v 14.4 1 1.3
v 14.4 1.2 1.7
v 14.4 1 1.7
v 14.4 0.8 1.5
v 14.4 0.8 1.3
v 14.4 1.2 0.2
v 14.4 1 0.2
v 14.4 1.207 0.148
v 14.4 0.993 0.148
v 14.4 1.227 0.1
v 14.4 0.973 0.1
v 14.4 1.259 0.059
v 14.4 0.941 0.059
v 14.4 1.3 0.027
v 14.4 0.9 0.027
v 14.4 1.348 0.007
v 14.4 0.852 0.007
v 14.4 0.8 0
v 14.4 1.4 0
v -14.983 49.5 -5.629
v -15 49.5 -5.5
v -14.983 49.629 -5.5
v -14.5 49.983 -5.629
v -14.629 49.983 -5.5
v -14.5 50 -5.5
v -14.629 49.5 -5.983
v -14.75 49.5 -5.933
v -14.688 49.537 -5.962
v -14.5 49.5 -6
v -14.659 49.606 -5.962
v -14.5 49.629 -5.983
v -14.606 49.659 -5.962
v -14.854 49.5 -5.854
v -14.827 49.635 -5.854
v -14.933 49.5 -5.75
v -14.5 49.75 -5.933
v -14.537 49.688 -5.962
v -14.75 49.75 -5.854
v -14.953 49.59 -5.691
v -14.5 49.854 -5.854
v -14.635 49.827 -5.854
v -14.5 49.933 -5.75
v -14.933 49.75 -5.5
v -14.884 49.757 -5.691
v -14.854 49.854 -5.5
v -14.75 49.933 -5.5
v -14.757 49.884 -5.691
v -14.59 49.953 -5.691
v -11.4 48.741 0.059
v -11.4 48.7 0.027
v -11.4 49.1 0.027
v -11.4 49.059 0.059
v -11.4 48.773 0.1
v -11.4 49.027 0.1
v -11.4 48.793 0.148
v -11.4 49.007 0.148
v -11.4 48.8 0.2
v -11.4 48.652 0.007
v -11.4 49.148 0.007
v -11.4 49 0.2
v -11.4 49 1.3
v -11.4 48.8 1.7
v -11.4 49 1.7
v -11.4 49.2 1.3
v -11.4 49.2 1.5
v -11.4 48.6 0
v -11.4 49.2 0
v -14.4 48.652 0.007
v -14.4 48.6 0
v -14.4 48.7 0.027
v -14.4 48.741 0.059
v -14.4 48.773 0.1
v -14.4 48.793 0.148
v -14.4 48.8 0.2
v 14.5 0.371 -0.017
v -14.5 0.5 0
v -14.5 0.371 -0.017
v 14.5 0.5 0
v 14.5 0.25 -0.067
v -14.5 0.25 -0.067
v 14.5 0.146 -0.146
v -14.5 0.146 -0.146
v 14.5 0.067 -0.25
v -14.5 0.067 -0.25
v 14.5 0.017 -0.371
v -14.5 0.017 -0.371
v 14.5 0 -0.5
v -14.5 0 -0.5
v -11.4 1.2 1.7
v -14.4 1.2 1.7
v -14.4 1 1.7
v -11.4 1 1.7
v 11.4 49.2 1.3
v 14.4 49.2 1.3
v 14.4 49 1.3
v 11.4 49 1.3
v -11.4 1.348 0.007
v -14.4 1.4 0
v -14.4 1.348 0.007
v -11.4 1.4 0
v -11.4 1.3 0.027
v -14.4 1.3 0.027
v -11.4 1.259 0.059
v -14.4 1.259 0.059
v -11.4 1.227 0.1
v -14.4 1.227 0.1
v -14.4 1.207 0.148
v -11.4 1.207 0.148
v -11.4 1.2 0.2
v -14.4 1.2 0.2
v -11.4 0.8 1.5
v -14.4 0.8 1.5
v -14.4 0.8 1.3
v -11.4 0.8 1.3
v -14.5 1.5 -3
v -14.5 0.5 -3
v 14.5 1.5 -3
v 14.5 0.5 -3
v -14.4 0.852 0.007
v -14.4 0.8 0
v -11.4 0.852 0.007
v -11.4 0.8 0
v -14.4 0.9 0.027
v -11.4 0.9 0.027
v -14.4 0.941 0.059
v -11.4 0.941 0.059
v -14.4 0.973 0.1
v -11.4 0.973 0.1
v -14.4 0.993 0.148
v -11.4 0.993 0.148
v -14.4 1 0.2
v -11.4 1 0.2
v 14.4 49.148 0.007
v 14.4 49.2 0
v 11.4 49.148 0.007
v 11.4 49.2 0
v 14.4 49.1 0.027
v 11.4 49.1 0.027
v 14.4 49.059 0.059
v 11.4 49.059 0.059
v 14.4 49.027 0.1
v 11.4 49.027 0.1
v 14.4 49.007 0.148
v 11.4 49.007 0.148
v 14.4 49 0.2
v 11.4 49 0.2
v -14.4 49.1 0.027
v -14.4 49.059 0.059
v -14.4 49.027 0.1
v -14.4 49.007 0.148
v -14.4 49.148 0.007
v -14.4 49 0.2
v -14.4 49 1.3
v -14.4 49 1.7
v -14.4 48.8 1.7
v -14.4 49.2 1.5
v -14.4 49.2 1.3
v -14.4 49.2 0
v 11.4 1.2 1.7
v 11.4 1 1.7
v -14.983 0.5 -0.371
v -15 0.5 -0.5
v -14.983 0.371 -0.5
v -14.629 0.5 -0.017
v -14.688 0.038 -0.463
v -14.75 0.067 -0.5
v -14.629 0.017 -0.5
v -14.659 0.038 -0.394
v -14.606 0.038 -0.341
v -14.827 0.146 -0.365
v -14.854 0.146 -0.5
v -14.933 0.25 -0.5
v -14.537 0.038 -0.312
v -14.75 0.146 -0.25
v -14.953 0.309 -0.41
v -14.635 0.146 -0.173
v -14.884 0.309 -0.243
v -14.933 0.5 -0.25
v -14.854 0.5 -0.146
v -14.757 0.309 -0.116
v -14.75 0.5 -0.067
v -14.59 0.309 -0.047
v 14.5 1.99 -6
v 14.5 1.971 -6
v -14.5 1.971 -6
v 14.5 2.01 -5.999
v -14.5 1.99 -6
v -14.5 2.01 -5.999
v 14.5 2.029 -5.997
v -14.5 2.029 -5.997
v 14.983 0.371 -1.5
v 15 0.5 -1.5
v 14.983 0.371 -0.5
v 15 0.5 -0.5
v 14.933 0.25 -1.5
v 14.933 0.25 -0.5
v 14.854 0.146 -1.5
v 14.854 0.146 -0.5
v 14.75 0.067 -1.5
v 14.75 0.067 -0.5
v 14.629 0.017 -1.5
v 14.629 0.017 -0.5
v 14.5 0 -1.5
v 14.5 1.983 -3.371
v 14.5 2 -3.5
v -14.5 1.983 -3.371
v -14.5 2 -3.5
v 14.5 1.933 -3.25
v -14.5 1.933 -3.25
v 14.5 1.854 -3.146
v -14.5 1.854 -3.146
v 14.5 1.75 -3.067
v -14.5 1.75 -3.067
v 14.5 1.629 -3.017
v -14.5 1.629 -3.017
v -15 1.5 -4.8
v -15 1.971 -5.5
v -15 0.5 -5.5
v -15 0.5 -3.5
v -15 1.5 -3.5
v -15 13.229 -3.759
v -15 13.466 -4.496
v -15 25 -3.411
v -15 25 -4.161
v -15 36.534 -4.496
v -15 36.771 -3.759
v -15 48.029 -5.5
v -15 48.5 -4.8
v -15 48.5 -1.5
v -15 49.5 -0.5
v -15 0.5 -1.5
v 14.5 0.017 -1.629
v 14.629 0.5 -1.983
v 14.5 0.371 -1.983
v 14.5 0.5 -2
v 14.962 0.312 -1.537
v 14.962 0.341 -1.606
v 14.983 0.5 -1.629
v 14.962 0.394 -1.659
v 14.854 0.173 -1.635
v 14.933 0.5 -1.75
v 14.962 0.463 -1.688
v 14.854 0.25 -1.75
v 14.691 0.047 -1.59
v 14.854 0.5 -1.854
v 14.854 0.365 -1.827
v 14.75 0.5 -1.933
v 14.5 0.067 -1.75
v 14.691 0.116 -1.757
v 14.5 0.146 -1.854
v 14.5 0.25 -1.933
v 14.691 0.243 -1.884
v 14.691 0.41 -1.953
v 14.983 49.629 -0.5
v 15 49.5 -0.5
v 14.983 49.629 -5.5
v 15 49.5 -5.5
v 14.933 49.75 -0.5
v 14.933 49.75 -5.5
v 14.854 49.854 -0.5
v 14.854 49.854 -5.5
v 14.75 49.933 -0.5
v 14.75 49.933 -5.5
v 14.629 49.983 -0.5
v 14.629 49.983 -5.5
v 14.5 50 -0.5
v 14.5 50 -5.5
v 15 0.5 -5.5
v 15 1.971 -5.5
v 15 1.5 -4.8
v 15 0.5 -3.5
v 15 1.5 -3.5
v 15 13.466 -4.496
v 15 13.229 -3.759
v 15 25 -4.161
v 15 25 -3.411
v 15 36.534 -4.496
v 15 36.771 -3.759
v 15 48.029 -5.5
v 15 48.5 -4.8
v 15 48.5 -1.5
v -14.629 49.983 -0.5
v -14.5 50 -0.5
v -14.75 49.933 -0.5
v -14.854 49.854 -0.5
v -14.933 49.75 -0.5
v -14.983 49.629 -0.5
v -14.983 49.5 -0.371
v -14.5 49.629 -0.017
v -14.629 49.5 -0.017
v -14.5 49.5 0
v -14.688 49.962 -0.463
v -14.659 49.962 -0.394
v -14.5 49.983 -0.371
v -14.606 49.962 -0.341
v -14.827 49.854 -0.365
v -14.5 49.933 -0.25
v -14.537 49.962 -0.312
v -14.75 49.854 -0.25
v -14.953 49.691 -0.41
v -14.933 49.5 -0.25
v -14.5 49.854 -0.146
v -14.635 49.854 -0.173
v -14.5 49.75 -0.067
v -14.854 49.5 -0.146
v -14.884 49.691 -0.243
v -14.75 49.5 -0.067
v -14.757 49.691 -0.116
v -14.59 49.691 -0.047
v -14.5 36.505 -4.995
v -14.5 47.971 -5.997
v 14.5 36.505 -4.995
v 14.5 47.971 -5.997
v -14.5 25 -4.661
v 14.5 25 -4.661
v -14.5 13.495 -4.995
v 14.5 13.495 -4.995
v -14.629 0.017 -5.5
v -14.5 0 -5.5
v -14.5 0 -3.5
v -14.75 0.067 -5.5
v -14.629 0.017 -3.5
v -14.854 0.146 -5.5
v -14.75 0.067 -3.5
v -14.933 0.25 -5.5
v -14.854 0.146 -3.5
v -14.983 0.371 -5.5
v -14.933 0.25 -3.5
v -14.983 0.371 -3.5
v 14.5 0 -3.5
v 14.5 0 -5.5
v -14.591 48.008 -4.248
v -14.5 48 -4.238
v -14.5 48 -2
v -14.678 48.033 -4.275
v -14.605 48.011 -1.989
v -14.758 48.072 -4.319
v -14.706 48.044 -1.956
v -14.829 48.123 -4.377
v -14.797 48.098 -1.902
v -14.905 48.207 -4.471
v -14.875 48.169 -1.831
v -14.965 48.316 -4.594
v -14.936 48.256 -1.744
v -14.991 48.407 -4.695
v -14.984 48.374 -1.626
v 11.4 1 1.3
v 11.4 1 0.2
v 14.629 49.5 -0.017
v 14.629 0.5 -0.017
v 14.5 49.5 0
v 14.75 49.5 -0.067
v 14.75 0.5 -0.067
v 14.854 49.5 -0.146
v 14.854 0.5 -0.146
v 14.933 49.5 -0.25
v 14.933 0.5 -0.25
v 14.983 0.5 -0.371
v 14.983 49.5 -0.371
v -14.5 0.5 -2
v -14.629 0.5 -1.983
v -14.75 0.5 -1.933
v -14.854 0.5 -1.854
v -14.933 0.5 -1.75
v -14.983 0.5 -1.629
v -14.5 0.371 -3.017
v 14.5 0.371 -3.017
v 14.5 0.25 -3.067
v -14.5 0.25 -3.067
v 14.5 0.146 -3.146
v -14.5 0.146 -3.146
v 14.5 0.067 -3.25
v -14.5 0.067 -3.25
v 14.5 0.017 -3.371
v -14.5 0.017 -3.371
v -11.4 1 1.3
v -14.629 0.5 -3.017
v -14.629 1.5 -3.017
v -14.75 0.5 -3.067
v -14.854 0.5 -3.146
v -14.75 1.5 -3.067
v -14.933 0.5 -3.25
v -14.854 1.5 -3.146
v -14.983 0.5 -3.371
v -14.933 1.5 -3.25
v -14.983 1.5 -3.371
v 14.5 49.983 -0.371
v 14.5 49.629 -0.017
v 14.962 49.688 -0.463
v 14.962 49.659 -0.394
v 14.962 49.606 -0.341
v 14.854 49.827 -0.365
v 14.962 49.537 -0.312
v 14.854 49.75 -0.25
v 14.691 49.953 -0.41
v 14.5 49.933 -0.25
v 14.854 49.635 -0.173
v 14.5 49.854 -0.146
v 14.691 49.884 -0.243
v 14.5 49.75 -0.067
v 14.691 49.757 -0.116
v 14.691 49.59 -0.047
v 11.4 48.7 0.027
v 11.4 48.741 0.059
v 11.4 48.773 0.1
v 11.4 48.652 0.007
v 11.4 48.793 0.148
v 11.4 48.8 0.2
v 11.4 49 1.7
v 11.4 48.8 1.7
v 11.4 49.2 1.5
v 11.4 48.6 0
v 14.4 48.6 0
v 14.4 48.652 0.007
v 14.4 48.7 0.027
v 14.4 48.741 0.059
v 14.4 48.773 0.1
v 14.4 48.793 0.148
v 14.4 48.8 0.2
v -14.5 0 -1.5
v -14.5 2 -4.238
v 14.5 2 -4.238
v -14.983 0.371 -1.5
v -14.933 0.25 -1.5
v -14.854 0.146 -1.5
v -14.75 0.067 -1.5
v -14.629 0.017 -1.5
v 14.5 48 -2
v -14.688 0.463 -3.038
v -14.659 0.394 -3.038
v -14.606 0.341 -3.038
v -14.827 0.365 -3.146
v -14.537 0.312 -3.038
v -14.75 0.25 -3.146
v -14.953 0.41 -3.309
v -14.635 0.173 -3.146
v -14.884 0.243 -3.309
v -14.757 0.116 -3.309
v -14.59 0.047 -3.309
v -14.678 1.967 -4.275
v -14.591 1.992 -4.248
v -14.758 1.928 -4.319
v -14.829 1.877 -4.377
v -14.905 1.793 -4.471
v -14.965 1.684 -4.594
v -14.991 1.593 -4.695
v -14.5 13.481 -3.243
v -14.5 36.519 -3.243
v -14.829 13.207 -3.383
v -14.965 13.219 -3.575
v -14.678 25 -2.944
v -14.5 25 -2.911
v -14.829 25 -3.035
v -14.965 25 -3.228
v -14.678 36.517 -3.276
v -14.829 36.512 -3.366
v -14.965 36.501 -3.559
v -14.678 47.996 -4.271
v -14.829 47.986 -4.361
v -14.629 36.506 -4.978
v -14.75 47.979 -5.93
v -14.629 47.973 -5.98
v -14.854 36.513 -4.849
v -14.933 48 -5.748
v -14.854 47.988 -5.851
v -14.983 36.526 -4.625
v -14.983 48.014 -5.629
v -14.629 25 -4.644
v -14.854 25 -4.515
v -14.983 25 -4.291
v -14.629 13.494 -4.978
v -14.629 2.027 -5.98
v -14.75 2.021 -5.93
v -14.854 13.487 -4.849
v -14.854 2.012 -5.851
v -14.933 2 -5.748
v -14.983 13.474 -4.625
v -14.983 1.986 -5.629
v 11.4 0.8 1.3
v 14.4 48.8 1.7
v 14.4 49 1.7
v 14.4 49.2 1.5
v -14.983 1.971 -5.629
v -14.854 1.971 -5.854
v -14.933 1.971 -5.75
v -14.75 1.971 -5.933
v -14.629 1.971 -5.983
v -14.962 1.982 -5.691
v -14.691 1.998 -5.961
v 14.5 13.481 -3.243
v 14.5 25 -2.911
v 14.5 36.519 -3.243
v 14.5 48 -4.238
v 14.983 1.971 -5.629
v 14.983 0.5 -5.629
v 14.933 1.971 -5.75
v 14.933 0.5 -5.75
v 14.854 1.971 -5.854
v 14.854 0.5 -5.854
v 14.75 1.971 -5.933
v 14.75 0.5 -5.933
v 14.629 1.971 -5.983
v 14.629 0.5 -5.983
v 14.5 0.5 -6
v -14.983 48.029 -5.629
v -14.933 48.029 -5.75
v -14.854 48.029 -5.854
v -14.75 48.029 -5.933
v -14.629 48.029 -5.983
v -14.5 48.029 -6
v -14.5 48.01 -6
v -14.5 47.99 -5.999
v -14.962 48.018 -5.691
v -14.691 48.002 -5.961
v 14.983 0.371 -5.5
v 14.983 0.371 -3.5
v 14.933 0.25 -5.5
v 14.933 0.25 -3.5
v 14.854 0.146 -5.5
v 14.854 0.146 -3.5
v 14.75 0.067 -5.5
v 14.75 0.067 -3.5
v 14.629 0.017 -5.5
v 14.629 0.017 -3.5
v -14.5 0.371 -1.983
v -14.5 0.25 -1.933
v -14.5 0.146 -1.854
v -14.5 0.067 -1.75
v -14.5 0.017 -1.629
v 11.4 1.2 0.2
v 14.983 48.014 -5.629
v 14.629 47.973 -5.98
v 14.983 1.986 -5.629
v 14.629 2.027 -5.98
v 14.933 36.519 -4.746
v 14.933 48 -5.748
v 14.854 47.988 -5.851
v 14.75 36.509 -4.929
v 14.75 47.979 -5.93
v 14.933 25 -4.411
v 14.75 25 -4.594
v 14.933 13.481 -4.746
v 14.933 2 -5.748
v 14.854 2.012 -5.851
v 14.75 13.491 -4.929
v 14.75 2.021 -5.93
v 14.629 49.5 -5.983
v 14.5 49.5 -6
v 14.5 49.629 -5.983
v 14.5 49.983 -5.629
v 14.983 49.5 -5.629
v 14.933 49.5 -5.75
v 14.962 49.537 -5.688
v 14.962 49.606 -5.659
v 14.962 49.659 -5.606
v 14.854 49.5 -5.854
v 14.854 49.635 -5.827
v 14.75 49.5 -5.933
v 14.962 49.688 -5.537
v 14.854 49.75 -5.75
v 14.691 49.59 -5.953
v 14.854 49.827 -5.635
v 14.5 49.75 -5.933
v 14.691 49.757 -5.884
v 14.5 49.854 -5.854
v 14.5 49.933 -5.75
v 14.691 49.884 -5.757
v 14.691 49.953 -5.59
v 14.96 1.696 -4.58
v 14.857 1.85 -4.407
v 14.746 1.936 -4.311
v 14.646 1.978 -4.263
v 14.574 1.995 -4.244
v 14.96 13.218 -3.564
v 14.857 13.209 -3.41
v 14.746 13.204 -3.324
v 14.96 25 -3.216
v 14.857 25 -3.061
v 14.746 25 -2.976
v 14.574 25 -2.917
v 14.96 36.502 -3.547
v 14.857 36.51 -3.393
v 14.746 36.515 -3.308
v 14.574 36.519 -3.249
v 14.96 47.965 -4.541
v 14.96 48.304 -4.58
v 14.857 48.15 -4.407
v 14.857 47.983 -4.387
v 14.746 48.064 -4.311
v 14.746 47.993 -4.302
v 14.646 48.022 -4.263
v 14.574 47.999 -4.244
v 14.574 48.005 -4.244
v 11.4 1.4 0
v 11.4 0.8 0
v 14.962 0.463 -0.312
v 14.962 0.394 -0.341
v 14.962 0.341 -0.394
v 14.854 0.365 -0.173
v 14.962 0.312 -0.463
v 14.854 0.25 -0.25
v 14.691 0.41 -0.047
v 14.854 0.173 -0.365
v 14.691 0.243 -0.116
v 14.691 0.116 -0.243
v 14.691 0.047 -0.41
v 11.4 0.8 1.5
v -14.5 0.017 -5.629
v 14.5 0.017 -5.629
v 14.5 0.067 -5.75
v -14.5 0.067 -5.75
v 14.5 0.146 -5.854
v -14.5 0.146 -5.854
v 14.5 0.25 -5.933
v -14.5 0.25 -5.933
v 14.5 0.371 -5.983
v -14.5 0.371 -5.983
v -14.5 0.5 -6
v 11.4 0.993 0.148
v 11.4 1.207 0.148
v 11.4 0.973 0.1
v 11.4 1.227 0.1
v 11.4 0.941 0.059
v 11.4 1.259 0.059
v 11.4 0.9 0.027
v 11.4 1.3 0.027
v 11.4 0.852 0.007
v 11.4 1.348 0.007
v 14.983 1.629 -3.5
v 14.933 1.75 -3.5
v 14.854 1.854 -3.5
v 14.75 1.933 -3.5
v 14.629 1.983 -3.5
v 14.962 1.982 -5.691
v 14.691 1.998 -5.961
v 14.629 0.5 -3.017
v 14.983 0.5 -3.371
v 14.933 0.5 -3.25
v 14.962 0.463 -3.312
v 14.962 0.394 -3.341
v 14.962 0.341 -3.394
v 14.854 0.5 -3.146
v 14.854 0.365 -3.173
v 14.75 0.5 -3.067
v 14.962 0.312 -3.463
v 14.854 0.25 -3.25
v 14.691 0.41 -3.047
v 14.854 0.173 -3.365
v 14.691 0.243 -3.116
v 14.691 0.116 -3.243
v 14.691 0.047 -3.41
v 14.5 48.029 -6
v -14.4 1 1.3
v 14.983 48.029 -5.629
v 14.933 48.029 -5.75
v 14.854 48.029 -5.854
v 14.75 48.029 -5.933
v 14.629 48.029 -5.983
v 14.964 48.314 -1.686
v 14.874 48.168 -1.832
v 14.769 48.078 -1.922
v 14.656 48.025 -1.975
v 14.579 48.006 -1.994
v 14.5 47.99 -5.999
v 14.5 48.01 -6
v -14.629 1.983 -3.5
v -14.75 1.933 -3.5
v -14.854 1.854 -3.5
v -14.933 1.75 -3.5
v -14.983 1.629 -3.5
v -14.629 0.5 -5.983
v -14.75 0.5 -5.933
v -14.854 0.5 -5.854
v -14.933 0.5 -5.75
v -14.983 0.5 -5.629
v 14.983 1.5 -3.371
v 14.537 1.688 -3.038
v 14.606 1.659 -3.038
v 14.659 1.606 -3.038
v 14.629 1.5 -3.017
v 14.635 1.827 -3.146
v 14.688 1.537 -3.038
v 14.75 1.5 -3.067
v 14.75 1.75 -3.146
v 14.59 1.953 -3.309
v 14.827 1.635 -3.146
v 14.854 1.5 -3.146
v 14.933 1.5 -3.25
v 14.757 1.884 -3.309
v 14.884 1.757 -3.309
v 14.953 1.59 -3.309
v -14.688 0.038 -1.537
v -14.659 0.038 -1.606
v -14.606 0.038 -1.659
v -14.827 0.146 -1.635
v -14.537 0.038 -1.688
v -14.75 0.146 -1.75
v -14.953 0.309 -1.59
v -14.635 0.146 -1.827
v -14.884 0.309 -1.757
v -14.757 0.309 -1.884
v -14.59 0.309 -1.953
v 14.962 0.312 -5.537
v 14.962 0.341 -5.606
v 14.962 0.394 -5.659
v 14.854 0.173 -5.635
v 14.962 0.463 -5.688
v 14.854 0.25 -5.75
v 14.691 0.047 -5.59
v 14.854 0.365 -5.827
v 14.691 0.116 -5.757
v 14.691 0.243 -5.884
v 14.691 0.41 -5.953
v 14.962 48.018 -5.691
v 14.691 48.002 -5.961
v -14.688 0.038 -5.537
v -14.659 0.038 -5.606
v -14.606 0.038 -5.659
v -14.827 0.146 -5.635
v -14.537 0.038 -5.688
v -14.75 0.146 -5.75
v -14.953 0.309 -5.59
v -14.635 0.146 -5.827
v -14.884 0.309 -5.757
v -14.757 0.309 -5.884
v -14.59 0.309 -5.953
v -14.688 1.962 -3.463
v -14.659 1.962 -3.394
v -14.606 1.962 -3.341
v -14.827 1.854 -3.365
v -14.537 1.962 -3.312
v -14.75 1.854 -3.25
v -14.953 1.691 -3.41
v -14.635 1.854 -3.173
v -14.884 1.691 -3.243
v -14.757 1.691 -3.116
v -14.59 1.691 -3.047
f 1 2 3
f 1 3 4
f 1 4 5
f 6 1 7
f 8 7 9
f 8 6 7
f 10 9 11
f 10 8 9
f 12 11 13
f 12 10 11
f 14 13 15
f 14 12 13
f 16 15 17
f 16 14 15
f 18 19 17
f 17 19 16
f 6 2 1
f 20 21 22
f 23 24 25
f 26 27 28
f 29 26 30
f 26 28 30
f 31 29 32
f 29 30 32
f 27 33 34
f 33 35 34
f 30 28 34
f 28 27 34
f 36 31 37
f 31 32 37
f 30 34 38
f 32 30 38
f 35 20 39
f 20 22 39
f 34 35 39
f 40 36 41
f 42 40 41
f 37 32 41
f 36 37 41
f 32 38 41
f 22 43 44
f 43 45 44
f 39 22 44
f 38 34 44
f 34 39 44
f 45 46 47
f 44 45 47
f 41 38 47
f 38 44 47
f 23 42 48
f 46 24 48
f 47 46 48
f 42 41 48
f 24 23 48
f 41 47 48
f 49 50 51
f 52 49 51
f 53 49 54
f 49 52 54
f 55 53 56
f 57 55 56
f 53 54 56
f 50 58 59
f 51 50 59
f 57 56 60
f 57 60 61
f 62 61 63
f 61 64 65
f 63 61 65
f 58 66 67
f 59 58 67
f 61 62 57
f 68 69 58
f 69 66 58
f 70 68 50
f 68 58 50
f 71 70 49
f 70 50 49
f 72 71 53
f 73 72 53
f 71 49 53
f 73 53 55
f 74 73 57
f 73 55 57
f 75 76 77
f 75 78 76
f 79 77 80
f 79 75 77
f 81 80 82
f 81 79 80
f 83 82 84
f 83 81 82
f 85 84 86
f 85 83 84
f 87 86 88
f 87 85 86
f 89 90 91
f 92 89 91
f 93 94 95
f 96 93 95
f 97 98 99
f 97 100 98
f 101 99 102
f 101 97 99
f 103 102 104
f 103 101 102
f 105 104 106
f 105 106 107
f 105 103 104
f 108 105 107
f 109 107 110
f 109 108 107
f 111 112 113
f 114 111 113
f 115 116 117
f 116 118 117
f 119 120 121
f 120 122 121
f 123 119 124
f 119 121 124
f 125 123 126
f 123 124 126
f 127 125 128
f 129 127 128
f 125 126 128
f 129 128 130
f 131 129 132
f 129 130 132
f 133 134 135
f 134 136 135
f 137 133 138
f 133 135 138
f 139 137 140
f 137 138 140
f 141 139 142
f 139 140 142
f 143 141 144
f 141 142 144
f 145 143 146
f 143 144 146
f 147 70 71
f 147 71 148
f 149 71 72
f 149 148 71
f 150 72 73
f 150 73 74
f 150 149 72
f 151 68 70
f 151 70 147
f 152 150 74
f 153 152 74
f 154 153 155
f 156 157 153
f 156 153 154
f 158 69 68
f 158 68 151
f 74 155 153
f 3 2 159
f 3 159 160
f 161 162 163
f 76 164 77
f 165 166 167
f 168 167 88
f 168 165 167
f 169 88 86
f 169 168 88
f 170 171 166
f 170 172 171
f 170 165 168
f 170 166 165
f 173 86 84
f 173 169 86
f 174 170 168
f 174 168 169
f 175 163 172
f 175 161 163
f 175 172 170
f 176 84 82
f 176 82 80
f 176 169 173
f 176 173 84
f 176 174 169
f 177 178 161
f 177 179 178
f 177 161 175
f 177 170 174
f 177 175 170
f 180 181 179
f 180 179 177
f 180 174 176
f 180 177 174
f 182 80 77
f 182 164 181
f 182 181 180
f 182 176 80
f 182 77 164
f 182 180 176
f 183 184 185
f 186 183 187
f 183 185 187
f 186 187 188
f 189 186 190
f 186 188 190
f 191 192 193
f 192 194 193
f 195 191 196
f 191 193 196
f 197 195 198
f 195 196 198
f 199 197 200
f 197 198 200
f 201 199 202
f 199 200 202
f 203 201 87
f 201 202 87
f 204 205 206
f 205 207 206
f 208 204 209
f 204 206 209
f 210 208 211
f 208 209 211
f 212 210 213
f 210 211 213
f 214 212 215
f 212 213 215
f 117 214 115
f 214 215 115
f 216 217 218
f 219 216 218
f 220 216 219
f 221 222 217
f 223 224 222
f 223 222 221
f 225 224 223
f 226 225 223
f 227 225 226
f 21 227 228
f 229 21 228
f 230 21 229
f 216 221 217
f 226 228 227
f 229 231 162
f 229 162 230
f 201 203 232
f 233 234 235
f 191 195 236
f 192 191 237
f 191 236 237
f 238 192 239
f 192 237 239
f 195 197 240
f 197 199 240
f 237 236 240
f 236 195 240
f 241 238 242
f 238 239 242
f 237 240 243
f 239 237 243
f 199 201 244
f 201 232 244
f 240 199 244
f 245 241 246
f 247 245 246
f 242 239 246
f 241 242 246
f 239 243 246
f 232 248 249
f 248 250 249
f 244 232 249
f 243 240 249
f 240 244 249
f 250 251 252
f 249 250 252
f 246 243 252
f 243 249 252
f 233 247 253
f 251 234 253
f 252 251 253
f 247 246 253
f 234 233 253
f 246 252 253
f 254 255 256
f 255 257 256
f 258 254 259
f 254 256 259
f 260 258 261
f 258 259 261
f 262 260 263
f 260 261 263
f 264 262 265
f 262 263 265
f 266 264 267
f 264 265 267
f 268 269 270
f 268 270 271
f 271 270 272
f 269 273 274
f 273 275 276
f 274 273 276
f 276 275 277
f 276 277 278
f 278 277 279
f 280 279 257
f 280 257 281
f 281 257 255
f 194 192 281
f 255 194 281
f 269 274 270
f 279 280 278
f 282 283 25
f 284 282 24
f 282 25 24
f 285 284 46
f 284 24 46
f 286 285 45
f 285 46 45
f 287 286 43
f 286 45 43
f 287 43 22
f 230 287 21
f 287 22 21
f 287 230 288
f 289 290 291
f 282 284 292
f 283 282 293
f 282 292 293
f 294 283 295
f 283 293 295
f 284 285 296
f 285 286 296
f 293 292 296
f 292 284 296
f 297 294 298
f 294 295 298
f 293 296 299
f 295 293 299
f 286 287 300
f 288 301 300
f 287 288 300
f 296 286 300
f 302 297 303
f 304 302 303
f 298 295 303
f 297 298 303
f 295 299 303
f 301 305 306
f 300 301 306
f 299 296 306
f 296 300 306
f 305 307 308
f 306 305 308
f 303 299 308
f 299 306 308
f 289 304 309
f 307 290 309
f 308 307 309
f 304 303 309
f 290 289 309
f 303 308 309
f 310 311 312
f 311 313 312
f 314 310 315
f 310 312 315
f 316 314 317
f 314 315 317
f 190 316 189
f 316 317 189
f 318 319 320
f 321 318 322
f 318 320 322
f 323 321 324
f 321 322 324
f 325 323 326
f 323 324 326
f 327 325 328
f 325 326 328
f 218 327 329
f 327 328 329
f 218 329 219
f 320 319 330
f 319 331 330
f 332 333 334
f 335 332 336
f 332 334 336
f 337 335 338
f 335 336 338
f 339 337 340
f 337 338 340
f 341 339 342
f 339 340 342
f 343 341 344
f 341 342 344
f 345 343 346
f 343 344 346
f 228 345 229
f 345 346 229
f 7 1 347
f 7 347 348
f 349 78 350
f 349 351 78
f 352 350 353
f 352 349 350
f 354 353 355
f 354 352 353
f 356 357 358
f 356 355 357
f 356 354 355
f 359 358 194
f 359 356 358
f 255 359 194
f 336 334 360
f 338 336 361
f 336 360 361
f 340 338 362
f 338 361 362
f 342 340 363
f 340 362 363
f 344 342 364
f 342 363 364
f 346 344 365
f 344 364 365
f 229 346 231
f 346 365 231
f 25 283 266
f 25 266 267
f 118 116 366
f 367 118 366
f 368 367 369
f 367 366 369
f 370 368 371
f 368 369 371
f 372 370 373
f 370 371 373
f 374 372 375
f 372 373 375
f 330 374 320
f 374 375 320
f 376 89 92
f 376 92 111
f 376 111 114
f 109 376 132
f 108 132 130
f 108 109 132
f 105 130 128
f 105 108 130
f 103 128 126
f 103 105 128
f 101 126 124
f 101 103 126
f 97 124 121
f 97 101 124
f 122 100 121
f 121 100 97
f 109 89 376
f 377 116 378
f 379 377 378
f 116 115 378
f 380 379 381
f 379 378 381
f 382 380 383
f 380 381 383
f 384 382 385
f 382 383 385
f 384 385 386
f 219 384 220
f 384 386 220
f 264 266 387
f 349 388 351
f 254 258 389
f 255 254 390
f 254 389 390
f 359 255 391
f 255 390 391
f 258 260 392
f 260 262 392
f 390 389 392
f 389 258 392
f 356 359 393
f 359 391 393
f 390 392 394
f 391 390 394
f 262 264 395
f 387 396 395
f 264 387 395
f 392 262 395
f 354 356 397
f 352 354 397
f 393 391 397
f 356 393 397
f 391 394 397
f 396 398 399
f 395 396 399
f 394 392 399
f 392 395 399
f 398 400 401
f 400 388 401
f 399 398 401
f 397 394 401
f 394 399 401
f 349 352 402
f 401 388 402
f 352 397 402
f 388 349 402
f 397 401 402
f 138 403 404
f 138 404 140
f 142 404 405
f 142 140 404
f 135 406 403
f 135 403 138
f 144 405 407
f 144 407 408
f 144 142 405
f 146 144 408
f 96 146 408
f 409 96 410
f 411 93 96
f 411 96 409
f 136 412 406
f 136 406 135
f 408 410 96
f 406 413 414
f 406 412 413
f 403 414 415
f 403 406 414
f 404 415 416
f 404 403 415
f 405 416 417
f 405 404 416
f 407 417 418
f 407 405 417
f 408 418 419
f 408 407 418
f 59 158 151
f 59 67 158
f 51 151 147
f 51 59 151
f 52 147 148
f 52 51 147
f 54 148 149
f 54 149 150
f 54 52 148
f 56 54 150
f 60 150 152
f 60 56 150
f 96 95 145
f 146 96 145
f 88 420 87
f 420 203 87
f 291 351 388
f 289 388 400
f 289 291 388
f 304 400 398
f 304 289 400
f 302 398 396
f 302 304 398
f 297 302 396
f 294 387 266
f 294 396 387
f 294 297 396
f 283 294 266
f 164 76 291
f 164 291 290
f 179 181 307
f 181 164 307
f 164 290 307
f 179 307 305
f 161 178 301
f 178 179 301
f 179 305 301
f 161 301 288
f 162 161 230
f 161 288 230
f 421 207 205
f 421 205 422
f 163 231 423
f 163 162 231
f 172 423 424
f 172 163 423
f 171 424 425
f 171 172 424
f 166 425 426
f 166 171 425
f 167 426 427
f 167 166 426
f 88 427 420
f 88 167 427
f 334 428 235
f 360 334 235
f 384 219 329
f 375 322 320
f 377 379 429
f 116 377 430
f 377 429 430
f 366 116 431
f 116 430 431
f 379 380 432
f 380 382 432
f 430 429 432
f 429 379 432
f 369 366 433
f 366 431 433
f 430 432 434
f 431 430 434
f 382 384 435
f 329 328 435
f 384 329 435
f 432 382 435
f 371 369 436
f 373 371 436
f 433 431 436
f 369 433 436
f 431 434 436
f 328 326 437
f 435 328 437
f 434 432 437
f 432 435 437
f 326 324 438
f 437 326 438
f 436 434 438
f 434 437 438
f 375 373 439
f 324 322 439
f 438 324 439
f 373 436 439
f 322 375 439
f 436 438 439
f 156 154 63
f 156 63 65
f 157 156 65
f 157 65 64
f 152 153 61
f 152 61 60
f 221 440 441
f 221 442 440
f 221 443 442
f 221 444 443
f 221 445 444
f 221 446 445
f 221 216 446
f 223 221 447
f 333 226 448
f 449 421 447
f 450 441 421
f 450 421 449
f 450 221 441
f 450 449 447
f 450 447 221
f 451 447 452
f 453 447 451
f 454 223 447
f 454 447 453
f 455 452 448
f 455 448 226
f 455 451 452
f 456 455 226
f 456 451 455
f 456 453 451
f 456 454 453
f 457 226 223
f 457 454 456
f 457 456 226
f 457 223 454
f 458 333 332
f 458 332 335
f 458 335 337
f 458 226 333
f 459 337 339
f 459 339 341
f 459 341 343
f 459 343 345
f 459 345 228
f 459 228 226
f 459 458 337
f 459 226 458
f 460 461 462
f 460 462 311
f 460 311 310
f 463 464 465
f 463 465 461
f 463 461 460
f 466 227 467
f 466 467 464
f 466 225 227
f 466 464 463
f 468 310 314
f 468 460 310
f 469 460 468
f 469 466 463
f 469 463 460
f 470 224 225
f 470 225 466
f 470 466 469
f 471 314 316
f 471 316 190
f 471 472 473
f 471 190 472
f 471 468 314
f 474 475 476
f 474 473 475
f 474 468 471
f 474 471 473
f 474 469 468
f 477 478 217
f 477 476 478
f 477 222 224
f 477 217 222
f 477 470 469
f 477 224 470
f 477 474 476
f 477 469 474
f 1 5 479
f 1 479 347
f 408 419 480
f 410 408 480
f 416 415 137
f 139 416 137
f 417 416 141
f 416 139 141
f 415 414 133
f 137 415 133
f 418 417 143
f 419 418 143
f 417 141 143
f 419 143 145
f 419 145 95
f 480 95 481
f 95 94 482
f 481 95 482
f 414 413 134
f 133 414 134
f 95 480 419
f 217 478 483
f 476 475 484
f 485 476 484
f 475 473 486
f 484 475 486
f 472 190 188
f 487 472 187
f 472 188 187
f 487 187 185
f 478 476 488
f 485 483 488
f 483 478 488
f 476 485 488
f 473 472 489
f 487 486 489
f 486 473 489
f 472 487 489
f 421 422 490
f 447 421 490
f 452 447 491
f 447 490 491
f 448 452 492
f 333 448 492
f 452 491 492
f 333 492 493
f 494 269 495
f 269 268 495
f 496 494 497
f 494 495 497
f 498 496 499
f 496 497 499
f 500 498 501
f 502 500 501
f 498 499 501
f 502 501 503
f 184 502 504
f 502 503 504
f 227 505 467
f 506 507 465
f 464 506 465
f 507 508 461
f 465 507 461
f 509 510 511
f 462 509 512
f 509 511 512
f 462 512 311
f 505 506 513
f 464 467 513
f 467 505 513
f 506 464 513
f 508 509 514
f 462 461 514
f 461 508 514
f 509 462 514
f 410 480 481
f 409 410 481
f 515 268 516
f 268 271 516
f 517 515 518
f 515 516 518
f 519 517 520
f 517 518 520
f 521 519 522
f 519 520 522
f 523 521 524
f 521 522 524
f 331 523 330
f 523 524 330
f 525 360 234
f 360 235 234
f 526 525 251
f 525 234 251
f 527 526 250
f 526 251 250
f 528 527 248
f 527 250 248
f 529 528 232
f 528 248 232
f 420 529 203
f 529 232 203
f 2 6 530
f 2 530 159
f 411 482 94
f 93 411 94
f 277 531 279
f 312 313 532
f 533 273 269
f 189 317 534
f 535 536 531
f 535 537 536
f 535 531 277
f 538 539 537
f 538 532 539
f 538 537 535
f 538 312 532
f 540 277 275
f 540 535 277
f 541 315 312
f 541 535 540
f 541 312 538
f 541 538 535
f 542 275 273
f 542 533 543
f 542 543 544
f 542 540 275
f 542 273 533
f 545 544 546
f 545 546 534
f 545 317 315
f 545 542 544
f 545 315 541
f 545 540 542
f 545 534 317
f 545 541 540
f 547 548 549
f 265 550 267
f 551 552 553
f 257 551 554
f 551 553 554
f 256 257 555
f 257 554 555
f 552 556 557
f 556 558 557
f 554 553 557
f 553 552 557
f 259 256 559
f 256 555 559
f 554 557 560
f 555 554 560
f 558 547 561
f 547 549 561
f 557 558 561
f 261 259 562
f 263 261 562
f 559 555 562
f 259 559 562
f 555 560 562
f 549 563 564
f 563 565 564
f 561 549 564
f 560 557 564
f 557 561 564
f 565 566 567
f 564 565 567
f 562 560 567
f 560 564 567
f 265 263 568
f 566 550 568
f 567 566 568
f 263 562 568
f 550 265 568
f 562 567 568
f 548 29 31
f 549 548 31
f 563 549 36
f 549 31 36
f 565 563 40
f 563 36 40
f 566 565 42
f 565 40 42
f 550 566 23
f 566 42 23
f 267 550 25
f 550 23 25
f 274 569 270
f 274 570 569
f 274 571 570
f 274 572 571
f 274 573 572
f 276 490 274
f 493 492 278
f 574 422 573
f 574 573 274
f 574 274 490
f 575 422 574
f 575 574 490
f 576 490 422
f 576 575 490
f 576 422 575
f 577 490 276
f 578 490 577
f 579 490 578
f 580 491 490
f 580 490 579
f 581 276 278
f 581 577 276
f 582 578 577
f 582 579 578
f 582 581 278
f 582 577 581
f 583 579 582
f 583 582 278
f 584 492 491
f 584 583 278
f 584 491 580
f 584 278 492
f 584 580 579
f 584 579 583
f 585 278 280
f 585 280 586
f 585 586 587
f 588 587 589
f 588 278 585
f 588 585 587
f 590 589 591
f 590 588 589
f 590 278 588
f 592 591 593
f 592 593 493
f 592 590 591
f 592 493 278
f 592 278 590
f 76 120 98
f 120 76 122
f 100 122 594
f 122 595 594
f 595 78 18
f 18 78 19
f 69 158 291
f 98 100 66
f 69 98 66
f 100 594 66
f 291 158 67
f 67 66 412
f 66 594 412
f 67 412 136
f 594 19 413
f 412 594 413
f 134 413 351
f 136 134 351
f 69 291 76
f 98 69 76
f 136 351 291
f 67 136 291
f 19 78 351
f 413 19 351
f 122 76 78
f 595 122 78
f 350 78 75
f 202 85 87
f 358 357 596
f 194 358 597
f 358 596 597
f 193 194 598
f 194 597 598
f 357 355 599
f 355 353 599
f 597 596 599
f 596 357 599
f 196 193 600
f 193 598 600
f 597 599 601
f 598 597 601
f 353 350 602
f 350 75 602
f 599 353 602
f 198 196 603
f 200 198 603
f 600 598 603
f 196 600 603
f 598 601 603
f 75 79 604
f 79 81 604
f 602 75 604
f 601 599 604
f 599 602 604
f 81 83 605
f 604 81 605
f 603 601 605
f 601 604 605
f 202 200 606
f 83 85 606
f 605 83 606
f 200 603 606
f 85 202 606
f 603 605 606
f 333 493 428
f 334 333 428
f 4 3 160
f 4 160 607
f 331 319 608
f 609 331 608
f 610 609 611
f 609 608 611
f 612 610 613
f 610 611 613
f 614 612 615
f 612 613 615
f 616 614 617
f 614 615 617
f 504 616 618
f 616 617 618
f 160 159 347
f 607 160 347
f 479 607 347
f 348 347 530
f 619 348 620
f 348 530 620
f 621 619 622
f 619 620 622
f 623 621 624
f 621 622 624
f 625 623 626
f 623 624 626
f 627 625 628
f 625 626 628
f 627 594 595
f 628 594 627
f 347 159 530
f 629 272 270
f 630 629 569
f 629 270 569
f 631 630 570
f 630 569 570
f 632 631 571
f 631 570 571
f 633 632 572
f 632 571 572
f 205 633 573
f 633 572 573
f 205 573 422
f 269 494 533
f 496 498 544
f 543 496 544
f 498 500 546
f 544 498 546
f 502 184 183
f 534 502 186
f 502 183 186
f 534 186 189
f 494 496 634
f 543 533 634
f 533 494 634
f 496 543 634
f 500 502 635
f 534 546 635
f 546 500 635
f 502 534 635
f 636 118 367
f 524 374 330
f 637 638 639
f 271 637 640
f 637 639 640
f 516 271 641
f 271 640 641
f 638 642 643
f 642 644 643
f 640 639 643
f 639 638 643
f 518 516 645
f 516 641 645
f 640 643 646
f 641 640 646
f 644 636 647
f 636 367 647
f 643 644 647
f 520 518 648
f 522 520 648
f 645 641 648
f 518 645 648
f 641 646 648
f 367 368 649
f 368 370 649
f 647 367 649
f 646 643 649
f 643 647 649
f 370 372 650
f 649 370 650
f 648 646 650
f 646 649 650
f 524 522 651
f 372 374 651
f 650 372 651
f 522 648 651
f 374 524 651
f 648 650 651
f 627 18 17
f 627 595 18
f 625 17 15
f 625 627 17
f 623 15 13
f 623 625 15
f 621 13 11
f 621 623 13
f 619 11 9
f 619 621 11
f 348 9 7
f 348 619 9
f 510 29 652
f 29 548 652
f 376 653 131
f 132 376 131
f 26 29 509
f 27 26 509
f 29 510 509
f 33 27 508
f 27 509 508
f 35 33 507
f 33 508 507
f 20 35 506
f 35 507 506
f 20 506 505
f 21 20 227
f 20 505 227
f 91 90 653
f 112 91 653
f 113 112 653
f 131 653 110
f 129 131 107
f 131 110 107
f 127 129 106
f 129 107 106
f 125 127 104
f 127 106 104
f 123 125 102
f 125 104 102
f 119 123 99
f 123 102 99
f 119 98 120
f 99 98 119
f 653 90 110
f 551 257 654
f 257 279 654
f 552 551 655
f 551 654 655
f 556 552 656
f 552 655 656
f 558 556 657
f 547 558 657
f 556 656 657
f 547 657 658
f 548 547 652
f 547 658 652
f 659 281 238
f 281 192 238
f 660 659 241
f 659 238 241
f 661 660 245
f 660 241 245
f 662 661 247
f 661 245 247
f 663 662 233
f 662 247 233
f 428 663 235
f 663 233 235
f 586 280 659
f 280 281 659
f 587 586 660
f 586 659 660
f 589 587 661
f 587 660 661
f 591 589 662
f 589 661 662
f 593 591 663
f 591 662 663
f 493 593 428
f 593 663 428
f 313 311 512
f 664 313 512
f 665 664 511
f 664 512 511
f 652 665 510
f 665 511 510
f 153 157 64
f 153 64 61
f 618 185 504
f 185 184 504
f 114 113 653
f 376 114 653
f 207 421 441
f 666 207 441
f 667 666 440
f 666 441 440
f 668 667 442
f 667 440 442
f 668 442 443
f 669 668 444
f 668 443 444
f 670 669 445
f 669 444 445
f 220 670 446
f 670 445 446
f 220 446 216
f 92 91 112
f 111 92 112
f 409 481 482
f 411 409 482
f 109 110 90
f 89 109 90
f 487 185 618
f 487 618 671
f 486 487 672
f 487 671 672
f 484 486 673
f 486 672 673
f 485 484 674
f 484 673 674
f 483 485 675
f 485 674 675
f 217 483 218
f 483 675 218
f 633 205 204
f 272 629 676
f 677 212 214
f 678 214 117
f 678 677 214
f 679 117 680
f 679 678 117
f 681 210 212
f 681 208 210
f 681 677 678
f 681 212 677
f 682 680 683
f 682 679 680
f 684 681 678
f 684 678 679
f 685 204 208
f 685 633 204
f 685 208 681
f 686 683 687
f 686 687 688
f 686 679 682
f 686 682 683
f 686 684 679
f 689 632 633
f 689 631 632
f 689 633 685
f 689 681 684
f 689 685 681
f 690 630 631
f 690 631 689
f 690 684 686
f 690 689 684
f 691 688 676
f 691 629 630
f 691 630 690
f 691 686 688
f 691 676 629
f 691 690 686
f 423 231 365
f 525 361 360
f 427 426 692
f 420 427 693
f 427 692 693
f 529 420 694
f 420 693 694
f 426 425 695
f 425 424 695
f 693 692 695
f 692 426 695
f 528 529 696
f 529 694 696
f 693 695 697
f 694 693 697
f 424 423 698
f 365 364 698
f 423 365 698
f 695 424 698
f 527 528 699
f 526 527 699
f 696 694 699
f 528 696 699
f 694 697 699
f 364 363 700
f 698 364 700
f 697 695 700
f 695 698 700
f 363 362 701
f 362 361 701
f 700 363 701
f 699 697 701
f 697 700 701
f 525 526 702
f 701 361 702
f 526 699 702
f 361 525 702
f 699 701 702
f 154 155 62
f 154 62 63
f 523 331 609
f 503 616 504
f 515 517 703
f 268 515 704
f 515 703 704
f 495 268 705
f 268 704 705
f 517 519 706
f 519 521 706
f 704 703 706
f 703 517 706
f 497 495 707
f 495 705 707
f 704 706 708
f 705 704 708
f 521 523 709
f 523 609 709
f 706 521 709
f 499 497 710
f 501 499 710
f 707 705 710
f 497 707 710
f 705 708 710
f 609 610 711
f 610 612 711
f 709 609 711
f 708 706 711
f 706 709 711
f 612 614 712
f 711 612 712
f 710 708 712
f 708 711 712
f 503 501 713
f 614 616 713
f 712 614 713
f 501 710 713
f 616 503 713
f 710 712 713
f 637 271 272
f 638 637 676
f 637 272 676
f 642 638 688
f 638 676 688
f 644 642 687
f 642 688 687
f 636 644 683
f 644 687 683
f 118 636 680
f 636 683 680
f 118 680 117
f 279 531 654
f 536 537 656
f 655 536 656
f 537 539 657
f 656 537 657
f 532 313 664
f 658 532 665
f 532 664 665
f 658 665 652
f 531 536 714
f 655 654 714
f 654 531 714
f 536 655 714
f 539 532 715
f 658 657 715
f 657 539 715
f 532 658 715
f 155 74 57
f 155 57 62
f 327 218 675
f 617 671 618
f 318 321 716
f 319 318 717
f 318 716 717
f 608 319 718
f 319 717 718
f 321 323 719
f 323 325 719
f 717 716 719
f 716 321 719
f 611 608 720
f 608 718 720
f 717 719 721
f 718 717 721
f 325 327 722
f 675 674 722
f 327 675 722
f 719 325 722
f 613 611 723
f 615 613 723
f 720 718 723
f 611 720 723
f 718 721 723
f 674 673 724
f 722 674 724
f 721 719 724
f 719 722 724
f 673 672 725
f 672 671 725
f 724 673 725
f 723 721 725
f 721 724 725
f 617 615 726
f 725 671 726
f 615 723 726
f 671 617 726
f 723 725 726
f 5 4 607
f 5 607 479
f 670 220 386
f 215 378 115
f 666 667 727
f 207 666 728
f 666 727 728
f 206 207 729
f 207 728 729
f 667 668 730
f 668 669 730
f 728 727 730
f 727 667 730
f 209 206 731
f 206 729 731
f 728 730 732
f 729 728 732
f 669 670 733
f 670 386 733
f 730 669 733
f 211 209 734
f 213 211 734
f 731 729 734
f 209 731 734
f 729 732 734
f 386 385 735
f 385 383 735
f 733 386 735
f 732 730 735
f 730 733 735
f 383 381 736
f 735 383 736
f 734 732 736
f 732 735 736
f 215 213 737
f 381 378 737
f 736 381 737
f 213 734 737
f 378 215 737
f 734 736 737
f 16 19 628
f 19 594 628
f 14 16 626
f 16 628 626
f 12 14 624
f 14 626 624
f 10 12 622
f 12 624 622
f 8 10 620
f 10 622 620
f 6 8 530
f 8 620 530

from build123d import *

# Parameters (mm, degrees)
CLIP_BODY_DEPTH                            = 15
PRISM_START                                = -0.6
PRISM_CANTILEVER_EXTRUDE_DEPTH             = 3
PRISM_CANTILEVER_EXTRUDE_FILLET_R          = 0.2
PRISM_CANTILEVER_EXTRUDE_FILLET_OF_PRISM_R = 0.2
GLOBAL_FILLET_R                            = 0.5


with BuildPart() as part:
    # Sketch1 → Clip Body (new, symmetric)
    with BuildSketch(Plane(origin=(0, 0, 0), x_dir=(0, 0, -1), z_dir=(1, 0, 0))):
        with BuildLine():
            Line((0, 0), (0, 50))
            Line((0, 50), (6, 50))
            Line((6, 50), (6, 48))
            ThreePointArc((6, 48), (4.661306176, 25), (6, 2))
            Line((6, 2), (6, 0))
            Line((6, 0), (3, 0))
            Line((3, 0), (3, 2))
            Line((3, 2), (4.238207846, 2))
            ThreePointArc((4.238207846, 2), (2.911306176, 25), (4.238207846, 48))
            Line((4.238207846, 48), (2, 48))
            Line((2, 48), (2, 0))
            Line((2, 0), (0, 0))
        make_face()
    extrude(amount=CLIP_BODY_DEPTH, both=True)

    # Sketch9 → Prism Cantilever Extrude (add)
    with BuildSketch(Plane.ZY.offset(15).offset(PRISM_START)):
        Polygon((1.7, 48.8), (1.7, 49), (1.5, 49.2), (1.3, 49.2), (1.3, 49), (0, 49), (0, 48.8), align=None)
        Polygon((1.3, 1), (0, 1), (0, 1.2), (1.7, 1.2), (1.7, 1), (1.5, 0.8), (1.3, 0.8), align=None)
    prism_cantilever_extrude = extrude(amount=-PRISM_CANTILEVER_EXTRUDE_DEPTH)

    # Prism Cantilever Extrude Fillet
    prism_cantilever_extrude_fillet_edges = [part.edges().sort_by_distance(p)[0] for p in [
        (-12.9, 1, 0),
        (-12.9, 1.2, 0),
        (-12.9, 48.8, 0),
        (-12.9, 49, 0),
    ]]
    fillet(prism_cantilever_extrude_fillet_edges, radius=PRISM_CANTILEVER_EXTRUDE_FILLET_R)

    # Prism Cantilever Extrude Mirror: Prism Cantilever Extrude across plane
    add(prism_cantilever_extrude.mirror(Plane(origin=(0, 0, 0), x_dir=(0, 0, 1), z_dir=(1, 0, 0))))

    # Prism Cantilever Extrude Fillet of Prism
    prism_cantilever_extrude_fillet_of_prism_edges = [part.edges().sort_by_distance(p)[0] for p in [
        (12.9, 1, 0),
        (12.9, 1.2, 0),
        (12.9, 48.8, 0),
        (12.9, 49, 0),
    ]]
    fillet(prism_cantilever_extrude_fillet_of_prism_edges, radius=PRISM_CANTILEVER_EXTRUDE_FILLET_OF_PRISM_R)

    # Global Fillet
    global_fillet_edges = [part.edges().sort_by_distance(p)[0] for p in [
        (-15, 25, 0),
        (-15, 50, -3),
        (15, 48, -3.119103923),
        (-15, 49, -6),
        (-15, 25, -4.661306176),
        (-15, 1, -6),
        (-15, 0, -4.5),
        (-15, 1, -3),
        (-15, 2, -3.619103923),
        (-15, 25, -2.911306176),
        (-15, 48, -3.119103923),
        (-15, 24, -2),
        (-15, 0, -1),
        (15, 25, -2.911306176),
        (0, 0, 0),
        (0, 50, 0),
        (0, 50, -6),
        (15, 2, -3.619103923),
        (0, 48, -6),
        (0, 2, -6),
        (0, 0, -6),
        (0, 0, -3),
        (0, 2, -3),
        (0, 0, -2),
        (15, 1, -3),
        (15, 0, -4.5),
        (15, 1, -6),
        (15, 25, -4.661306176),
        (15, 49, -6),
        (15, 50, -3),
        (15, 25, 0),
        (15, 0, -1),
        (15, 24, -2),
    ]]
    fillet(global_fillet_edges, radius=GLOBAL_FILLET_R)


solid = part.part
